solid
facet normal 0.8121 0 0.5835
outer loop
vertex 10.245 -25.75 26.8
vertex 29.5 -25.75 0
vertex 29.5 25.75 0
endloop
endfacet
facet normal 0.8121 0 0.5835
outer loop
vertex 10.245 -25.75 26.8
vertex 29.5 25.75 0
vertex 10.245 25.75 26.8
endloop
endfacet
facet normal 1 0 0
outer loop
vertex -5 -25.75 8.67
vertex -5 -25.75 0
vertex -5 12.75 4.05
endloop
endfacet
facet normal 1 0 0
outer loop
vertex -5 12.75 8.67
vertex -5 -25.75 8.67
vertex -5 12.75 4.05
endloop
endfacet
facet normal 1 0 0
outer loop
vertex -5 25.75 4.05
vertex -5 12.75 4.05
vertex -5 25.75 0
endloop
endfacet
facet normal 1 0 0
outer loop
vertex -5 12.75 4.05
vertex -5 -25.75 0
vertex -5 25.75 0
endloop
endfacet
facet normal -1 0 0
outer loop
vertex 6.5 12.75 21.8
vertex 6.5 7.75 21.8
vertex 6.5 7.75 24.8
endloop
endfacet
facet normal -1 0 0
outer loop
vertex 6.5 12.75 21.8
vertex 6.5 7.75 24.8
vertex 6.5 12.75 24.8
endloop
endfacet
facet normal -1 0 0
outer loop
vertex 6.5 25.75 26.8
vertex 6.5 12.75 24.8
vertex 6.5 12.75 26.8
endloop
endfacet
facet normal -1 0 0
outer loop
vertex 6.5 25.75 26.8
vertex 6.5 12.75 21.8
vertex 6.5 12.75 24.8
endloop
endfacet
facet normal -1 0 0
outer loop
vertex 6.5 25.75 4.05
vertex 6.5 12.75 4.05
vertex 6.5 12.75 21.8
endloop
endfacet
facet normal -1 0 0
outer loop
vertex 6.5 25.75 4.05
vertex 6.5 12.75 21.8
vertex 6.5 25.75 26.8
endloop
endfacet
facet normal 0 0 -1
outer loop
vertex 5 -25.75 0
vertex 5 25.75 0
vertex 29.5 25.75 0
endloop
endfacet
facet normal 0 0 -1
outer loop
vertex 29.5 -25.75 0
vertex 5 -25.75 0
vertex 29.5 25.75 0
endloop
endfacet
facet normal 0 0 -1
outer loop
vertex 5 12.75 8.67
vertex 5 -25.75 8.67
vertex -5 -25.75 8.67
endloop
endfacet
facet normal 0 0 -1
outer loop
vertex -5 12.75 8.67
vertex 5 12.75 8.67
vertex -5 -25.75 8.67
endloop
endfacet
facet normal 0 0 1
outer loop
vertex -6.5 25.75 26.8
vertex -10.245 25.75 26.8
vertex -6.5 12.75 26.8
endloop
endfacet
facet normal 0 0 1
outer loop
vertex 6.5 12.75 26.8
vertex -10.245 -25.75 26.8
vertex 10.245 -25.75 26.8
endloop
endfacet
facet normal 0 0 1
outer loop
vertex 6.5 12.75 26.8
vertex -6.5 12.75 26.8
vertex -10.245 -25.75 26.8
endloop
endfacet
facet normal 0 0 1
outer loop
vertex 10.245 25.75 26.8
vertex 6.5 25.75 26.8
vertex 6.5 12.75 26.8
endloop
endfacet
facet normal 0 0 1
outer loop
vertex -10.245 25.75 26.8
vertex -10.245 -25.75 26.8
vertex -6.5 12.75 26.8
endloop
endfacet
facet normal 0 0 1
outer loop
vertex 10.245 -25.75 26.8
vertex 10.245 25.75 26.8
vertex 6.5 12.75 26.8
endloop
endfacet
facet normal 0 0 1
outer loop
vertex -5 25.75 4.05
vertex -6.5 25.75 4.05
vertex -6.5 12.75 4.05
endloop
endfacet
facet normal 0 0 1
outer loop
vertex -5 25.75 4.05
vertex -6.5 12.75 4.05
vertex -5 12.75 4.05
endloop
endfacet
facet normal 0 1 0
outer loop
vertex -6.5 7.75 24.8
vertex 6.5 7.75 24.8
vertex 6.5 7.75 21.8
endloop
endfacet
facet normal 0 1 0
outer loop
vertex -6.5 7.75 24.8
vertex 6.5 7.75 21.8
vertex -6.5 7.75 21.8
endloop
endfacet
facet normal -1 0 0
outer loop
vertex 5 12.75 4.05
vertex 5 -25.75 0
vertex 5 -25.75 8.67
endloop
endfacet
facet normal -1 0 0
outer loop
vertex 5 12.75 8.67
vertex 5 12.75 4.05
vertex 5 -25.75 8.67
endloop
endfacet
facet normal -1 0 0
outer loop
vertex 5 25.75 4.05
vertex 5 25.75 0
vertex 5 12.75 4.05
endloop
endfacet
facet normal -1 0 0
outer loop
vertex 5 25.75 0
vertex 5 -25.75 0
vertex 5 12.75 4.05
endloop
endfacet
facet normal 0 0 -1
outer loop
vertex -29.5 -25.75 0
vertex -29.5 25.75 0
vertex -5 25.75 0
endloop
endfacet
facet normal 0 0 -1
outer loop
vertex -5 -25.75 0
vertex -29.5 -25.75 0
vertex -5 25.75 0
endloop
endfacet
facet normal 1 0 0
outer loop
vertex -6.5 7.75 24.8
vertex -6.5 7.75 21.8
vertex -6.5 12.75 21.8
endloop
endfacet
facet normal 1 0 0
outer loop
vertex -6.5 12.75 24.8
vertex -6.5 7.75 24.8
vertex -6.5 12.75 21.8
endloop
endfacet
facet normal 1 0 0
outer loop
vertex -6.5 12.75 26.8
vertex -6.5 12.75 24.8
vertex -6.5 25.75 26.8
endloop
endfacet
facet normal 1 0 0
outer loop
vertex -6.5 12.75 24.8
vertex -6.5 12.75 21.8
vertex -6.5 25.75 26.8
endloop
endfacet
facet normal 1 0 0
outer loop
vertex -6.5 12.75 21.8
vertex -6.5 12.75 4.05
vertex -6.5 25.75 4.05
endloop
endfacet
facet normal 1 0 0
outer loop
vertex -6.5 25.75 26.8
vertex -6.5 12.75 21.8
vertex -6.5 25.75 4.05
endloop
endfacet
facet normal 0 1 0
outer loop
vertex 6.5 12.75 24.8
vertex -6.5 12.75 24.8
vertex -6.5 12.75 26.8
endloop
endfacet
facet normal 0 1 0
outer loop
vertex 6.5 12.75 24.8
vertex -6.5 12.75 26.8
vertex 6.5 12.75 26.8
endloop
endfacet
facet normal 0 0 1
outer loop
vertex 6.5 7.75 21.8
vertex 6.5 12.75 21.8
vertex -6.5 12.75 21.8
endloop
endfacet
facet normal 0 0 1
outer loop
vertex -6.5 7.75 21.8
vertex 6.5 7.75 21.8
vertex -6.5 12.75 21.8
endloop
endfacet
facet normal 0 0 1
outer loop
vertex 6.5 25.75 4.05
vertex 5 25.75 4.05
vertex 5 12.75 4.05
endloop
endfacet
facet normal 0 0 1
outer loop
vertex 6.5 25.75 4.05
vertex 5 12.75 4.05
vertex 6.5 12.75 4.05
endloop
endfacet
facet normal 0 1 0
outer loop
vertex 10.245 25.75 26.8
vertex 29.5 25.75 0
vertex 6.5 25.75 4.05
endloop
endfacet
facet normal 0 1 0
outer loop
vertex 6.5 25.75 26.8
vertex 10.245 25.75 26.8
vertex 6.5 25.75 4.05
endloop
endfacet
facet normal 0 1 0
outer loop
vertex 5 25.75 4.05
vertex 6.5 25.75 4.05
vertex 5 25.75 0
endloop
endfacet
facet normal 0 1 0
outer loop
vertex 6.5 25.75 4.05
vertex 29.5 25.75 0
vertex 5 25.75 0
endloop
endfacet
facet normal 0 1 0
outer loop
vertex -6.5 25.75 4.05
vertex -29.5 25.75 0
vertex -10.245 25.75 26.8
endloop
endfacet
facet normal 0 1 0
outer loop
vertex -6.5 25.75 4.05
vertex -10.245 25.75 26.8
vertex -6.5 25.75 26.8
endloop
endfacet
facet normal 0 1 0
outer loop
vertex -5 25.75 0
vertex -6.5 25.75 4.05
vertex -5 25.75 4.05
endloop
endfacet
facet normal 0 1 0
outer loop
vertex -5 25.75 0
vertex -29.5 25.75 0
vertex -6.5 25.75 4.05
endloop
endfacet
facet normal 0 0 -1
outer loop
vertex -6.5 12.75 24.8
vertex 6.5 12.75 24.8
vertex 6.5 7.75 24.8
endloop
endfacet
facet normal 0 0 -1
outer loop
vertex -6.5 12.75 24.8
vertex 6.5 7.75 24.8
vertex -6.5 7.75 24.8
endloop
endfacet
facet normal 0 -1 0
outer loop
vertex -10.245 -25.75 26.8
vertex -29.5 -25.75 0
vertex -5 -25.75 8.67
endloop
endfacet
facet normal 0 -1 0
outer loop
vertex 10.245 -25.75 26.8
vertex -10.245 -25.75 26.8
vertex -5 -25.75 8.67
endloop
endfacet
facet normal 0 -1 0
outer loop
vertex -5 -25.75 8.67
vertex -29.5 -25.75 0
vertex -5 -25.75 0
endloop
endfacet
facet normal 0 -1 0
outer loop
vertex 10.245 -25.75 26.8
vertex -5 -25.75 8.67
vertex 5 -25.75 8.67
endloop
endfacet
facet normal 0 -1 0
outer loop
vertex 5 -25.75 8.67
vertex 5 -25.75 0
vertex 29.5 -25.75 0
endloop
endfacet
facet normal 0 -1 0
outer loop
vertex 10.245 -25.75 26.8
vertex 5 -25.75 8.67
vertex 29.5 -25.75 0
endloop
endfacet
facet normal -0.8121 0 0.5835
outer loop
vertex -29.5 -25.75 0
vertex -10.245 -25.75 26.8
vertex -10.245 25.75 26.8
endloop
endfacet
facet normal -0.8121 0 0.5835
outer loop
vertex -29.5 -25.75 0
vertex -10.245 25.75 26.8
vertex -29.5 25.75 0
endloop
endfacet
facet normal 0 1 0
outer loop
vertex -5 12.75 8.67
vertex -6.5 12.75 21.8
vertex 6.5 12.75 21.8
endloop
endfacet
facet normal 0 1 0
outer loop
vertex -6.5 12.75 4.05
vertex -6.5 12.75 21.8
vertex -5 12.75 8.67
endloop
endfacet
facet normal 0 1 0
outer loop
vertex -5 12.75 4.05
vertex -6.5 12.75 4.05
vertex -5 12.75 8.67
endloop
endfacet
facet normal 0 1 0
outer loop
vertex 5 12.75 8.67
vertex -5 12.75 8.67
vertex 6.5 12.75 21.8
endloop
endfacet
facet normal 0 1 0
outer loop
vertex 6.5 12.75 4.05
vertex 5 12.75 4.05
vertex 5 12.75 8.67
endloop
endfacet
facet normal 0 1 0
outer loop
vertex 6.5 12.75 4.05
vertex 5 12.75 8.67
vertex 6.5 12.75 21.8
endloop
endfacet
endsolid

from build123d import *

# Parameters (mm, degrees)
F0_W      = 20.5
F0_H      = 51.5
F0_W_2    = 19.25
F1_DEPTH  = 26.8
F2_W      = 13
F2_H      = 13
F3_DEPTH  = 26.8
F4_W      = 1.5
F4_H      = 13
F5_DEPTH  = 4.05
F7_DEPTH  = 51.501
F8_W      = 10
F8_H      = 8.67
F9_DEPTH  = 38.501
F10_W     = 13
F10_H     = 3
F11_DEPTH = 5


with BuildPart() as f1:
    # F0 (on Top) → F1 (new body)
    with BuildSketch(Plane.XY):
        Rectangle(F0_W, F0_H)
        with Locations((-19.875, 0)):
            Rectangle(F0_W_2, F0_H)
        with Locations((19.875, 0)):
            Rectangle(F0_W_2, F0_H)
    extrude(amount=F1_DEPTH)

    # F2 (on Top) → F3 (cut)
    with BuildSketch(Plane.XY):
        with Locations((0, 19.25)):
            Rectangle(F2_W, F2_H)
    extrude(amount=F3_DEPTH, mode=Mode.SUBTRACT)

    # F4 (on face) → F5 (join)
    with BuildSketch(Plane.XY):
        with Locations((-5.75, 19.25)):
            Rectangle(F4_W, F4_H)
        with Locations((5.75, 19.25)):
            Rectangle(F4_W, F4_H)
    extrude(amount=F5_DEPTH)

    # F6 (on face) → F7 (cut, through all)
    with BuildSketch(Plane(origin=(0, 25.75, 0), x_dir=(-1, 0, 0), z_dir=(0, 1, 0))):
        Polygon((10.244871, 26.8), (29.5, 0), (29.5, 26.8), align=None)
        Polygon((-29.5, 0), (-10.244871, 26.8), (-29.5, 26.8), align=None)
    extrude(amount=-F7_DEPTH, mode=Mode.SUBTRACT)

    # F8 (on face) → F9 (cut, through all)
    with BuildSketch(Plane(origin=(0, 12.75, 0), x_dir=(-1, 0, 0), z_dir=(0, 1, 0))):
        with Locations((0, 4.335)):
            Rectangle(F8_W, F8_H)
    extrude(amount=-F9_DEPTH, mode=Mode.SUBTRACT)

    # F10 (on face) → F11 (cut)
    with BuildSketch(Plane(origin=(0, 12.75, 0), x_dir=(-1, 0, 0), z_dir=(0, 1, 0))):
        with Locations((0, 23.3)):
            Rectangle(F10_W, F10_H)
    extrude(amount=-F11_DEPTH, mode=Mode.SUBTRACT)


solid = f1.part
